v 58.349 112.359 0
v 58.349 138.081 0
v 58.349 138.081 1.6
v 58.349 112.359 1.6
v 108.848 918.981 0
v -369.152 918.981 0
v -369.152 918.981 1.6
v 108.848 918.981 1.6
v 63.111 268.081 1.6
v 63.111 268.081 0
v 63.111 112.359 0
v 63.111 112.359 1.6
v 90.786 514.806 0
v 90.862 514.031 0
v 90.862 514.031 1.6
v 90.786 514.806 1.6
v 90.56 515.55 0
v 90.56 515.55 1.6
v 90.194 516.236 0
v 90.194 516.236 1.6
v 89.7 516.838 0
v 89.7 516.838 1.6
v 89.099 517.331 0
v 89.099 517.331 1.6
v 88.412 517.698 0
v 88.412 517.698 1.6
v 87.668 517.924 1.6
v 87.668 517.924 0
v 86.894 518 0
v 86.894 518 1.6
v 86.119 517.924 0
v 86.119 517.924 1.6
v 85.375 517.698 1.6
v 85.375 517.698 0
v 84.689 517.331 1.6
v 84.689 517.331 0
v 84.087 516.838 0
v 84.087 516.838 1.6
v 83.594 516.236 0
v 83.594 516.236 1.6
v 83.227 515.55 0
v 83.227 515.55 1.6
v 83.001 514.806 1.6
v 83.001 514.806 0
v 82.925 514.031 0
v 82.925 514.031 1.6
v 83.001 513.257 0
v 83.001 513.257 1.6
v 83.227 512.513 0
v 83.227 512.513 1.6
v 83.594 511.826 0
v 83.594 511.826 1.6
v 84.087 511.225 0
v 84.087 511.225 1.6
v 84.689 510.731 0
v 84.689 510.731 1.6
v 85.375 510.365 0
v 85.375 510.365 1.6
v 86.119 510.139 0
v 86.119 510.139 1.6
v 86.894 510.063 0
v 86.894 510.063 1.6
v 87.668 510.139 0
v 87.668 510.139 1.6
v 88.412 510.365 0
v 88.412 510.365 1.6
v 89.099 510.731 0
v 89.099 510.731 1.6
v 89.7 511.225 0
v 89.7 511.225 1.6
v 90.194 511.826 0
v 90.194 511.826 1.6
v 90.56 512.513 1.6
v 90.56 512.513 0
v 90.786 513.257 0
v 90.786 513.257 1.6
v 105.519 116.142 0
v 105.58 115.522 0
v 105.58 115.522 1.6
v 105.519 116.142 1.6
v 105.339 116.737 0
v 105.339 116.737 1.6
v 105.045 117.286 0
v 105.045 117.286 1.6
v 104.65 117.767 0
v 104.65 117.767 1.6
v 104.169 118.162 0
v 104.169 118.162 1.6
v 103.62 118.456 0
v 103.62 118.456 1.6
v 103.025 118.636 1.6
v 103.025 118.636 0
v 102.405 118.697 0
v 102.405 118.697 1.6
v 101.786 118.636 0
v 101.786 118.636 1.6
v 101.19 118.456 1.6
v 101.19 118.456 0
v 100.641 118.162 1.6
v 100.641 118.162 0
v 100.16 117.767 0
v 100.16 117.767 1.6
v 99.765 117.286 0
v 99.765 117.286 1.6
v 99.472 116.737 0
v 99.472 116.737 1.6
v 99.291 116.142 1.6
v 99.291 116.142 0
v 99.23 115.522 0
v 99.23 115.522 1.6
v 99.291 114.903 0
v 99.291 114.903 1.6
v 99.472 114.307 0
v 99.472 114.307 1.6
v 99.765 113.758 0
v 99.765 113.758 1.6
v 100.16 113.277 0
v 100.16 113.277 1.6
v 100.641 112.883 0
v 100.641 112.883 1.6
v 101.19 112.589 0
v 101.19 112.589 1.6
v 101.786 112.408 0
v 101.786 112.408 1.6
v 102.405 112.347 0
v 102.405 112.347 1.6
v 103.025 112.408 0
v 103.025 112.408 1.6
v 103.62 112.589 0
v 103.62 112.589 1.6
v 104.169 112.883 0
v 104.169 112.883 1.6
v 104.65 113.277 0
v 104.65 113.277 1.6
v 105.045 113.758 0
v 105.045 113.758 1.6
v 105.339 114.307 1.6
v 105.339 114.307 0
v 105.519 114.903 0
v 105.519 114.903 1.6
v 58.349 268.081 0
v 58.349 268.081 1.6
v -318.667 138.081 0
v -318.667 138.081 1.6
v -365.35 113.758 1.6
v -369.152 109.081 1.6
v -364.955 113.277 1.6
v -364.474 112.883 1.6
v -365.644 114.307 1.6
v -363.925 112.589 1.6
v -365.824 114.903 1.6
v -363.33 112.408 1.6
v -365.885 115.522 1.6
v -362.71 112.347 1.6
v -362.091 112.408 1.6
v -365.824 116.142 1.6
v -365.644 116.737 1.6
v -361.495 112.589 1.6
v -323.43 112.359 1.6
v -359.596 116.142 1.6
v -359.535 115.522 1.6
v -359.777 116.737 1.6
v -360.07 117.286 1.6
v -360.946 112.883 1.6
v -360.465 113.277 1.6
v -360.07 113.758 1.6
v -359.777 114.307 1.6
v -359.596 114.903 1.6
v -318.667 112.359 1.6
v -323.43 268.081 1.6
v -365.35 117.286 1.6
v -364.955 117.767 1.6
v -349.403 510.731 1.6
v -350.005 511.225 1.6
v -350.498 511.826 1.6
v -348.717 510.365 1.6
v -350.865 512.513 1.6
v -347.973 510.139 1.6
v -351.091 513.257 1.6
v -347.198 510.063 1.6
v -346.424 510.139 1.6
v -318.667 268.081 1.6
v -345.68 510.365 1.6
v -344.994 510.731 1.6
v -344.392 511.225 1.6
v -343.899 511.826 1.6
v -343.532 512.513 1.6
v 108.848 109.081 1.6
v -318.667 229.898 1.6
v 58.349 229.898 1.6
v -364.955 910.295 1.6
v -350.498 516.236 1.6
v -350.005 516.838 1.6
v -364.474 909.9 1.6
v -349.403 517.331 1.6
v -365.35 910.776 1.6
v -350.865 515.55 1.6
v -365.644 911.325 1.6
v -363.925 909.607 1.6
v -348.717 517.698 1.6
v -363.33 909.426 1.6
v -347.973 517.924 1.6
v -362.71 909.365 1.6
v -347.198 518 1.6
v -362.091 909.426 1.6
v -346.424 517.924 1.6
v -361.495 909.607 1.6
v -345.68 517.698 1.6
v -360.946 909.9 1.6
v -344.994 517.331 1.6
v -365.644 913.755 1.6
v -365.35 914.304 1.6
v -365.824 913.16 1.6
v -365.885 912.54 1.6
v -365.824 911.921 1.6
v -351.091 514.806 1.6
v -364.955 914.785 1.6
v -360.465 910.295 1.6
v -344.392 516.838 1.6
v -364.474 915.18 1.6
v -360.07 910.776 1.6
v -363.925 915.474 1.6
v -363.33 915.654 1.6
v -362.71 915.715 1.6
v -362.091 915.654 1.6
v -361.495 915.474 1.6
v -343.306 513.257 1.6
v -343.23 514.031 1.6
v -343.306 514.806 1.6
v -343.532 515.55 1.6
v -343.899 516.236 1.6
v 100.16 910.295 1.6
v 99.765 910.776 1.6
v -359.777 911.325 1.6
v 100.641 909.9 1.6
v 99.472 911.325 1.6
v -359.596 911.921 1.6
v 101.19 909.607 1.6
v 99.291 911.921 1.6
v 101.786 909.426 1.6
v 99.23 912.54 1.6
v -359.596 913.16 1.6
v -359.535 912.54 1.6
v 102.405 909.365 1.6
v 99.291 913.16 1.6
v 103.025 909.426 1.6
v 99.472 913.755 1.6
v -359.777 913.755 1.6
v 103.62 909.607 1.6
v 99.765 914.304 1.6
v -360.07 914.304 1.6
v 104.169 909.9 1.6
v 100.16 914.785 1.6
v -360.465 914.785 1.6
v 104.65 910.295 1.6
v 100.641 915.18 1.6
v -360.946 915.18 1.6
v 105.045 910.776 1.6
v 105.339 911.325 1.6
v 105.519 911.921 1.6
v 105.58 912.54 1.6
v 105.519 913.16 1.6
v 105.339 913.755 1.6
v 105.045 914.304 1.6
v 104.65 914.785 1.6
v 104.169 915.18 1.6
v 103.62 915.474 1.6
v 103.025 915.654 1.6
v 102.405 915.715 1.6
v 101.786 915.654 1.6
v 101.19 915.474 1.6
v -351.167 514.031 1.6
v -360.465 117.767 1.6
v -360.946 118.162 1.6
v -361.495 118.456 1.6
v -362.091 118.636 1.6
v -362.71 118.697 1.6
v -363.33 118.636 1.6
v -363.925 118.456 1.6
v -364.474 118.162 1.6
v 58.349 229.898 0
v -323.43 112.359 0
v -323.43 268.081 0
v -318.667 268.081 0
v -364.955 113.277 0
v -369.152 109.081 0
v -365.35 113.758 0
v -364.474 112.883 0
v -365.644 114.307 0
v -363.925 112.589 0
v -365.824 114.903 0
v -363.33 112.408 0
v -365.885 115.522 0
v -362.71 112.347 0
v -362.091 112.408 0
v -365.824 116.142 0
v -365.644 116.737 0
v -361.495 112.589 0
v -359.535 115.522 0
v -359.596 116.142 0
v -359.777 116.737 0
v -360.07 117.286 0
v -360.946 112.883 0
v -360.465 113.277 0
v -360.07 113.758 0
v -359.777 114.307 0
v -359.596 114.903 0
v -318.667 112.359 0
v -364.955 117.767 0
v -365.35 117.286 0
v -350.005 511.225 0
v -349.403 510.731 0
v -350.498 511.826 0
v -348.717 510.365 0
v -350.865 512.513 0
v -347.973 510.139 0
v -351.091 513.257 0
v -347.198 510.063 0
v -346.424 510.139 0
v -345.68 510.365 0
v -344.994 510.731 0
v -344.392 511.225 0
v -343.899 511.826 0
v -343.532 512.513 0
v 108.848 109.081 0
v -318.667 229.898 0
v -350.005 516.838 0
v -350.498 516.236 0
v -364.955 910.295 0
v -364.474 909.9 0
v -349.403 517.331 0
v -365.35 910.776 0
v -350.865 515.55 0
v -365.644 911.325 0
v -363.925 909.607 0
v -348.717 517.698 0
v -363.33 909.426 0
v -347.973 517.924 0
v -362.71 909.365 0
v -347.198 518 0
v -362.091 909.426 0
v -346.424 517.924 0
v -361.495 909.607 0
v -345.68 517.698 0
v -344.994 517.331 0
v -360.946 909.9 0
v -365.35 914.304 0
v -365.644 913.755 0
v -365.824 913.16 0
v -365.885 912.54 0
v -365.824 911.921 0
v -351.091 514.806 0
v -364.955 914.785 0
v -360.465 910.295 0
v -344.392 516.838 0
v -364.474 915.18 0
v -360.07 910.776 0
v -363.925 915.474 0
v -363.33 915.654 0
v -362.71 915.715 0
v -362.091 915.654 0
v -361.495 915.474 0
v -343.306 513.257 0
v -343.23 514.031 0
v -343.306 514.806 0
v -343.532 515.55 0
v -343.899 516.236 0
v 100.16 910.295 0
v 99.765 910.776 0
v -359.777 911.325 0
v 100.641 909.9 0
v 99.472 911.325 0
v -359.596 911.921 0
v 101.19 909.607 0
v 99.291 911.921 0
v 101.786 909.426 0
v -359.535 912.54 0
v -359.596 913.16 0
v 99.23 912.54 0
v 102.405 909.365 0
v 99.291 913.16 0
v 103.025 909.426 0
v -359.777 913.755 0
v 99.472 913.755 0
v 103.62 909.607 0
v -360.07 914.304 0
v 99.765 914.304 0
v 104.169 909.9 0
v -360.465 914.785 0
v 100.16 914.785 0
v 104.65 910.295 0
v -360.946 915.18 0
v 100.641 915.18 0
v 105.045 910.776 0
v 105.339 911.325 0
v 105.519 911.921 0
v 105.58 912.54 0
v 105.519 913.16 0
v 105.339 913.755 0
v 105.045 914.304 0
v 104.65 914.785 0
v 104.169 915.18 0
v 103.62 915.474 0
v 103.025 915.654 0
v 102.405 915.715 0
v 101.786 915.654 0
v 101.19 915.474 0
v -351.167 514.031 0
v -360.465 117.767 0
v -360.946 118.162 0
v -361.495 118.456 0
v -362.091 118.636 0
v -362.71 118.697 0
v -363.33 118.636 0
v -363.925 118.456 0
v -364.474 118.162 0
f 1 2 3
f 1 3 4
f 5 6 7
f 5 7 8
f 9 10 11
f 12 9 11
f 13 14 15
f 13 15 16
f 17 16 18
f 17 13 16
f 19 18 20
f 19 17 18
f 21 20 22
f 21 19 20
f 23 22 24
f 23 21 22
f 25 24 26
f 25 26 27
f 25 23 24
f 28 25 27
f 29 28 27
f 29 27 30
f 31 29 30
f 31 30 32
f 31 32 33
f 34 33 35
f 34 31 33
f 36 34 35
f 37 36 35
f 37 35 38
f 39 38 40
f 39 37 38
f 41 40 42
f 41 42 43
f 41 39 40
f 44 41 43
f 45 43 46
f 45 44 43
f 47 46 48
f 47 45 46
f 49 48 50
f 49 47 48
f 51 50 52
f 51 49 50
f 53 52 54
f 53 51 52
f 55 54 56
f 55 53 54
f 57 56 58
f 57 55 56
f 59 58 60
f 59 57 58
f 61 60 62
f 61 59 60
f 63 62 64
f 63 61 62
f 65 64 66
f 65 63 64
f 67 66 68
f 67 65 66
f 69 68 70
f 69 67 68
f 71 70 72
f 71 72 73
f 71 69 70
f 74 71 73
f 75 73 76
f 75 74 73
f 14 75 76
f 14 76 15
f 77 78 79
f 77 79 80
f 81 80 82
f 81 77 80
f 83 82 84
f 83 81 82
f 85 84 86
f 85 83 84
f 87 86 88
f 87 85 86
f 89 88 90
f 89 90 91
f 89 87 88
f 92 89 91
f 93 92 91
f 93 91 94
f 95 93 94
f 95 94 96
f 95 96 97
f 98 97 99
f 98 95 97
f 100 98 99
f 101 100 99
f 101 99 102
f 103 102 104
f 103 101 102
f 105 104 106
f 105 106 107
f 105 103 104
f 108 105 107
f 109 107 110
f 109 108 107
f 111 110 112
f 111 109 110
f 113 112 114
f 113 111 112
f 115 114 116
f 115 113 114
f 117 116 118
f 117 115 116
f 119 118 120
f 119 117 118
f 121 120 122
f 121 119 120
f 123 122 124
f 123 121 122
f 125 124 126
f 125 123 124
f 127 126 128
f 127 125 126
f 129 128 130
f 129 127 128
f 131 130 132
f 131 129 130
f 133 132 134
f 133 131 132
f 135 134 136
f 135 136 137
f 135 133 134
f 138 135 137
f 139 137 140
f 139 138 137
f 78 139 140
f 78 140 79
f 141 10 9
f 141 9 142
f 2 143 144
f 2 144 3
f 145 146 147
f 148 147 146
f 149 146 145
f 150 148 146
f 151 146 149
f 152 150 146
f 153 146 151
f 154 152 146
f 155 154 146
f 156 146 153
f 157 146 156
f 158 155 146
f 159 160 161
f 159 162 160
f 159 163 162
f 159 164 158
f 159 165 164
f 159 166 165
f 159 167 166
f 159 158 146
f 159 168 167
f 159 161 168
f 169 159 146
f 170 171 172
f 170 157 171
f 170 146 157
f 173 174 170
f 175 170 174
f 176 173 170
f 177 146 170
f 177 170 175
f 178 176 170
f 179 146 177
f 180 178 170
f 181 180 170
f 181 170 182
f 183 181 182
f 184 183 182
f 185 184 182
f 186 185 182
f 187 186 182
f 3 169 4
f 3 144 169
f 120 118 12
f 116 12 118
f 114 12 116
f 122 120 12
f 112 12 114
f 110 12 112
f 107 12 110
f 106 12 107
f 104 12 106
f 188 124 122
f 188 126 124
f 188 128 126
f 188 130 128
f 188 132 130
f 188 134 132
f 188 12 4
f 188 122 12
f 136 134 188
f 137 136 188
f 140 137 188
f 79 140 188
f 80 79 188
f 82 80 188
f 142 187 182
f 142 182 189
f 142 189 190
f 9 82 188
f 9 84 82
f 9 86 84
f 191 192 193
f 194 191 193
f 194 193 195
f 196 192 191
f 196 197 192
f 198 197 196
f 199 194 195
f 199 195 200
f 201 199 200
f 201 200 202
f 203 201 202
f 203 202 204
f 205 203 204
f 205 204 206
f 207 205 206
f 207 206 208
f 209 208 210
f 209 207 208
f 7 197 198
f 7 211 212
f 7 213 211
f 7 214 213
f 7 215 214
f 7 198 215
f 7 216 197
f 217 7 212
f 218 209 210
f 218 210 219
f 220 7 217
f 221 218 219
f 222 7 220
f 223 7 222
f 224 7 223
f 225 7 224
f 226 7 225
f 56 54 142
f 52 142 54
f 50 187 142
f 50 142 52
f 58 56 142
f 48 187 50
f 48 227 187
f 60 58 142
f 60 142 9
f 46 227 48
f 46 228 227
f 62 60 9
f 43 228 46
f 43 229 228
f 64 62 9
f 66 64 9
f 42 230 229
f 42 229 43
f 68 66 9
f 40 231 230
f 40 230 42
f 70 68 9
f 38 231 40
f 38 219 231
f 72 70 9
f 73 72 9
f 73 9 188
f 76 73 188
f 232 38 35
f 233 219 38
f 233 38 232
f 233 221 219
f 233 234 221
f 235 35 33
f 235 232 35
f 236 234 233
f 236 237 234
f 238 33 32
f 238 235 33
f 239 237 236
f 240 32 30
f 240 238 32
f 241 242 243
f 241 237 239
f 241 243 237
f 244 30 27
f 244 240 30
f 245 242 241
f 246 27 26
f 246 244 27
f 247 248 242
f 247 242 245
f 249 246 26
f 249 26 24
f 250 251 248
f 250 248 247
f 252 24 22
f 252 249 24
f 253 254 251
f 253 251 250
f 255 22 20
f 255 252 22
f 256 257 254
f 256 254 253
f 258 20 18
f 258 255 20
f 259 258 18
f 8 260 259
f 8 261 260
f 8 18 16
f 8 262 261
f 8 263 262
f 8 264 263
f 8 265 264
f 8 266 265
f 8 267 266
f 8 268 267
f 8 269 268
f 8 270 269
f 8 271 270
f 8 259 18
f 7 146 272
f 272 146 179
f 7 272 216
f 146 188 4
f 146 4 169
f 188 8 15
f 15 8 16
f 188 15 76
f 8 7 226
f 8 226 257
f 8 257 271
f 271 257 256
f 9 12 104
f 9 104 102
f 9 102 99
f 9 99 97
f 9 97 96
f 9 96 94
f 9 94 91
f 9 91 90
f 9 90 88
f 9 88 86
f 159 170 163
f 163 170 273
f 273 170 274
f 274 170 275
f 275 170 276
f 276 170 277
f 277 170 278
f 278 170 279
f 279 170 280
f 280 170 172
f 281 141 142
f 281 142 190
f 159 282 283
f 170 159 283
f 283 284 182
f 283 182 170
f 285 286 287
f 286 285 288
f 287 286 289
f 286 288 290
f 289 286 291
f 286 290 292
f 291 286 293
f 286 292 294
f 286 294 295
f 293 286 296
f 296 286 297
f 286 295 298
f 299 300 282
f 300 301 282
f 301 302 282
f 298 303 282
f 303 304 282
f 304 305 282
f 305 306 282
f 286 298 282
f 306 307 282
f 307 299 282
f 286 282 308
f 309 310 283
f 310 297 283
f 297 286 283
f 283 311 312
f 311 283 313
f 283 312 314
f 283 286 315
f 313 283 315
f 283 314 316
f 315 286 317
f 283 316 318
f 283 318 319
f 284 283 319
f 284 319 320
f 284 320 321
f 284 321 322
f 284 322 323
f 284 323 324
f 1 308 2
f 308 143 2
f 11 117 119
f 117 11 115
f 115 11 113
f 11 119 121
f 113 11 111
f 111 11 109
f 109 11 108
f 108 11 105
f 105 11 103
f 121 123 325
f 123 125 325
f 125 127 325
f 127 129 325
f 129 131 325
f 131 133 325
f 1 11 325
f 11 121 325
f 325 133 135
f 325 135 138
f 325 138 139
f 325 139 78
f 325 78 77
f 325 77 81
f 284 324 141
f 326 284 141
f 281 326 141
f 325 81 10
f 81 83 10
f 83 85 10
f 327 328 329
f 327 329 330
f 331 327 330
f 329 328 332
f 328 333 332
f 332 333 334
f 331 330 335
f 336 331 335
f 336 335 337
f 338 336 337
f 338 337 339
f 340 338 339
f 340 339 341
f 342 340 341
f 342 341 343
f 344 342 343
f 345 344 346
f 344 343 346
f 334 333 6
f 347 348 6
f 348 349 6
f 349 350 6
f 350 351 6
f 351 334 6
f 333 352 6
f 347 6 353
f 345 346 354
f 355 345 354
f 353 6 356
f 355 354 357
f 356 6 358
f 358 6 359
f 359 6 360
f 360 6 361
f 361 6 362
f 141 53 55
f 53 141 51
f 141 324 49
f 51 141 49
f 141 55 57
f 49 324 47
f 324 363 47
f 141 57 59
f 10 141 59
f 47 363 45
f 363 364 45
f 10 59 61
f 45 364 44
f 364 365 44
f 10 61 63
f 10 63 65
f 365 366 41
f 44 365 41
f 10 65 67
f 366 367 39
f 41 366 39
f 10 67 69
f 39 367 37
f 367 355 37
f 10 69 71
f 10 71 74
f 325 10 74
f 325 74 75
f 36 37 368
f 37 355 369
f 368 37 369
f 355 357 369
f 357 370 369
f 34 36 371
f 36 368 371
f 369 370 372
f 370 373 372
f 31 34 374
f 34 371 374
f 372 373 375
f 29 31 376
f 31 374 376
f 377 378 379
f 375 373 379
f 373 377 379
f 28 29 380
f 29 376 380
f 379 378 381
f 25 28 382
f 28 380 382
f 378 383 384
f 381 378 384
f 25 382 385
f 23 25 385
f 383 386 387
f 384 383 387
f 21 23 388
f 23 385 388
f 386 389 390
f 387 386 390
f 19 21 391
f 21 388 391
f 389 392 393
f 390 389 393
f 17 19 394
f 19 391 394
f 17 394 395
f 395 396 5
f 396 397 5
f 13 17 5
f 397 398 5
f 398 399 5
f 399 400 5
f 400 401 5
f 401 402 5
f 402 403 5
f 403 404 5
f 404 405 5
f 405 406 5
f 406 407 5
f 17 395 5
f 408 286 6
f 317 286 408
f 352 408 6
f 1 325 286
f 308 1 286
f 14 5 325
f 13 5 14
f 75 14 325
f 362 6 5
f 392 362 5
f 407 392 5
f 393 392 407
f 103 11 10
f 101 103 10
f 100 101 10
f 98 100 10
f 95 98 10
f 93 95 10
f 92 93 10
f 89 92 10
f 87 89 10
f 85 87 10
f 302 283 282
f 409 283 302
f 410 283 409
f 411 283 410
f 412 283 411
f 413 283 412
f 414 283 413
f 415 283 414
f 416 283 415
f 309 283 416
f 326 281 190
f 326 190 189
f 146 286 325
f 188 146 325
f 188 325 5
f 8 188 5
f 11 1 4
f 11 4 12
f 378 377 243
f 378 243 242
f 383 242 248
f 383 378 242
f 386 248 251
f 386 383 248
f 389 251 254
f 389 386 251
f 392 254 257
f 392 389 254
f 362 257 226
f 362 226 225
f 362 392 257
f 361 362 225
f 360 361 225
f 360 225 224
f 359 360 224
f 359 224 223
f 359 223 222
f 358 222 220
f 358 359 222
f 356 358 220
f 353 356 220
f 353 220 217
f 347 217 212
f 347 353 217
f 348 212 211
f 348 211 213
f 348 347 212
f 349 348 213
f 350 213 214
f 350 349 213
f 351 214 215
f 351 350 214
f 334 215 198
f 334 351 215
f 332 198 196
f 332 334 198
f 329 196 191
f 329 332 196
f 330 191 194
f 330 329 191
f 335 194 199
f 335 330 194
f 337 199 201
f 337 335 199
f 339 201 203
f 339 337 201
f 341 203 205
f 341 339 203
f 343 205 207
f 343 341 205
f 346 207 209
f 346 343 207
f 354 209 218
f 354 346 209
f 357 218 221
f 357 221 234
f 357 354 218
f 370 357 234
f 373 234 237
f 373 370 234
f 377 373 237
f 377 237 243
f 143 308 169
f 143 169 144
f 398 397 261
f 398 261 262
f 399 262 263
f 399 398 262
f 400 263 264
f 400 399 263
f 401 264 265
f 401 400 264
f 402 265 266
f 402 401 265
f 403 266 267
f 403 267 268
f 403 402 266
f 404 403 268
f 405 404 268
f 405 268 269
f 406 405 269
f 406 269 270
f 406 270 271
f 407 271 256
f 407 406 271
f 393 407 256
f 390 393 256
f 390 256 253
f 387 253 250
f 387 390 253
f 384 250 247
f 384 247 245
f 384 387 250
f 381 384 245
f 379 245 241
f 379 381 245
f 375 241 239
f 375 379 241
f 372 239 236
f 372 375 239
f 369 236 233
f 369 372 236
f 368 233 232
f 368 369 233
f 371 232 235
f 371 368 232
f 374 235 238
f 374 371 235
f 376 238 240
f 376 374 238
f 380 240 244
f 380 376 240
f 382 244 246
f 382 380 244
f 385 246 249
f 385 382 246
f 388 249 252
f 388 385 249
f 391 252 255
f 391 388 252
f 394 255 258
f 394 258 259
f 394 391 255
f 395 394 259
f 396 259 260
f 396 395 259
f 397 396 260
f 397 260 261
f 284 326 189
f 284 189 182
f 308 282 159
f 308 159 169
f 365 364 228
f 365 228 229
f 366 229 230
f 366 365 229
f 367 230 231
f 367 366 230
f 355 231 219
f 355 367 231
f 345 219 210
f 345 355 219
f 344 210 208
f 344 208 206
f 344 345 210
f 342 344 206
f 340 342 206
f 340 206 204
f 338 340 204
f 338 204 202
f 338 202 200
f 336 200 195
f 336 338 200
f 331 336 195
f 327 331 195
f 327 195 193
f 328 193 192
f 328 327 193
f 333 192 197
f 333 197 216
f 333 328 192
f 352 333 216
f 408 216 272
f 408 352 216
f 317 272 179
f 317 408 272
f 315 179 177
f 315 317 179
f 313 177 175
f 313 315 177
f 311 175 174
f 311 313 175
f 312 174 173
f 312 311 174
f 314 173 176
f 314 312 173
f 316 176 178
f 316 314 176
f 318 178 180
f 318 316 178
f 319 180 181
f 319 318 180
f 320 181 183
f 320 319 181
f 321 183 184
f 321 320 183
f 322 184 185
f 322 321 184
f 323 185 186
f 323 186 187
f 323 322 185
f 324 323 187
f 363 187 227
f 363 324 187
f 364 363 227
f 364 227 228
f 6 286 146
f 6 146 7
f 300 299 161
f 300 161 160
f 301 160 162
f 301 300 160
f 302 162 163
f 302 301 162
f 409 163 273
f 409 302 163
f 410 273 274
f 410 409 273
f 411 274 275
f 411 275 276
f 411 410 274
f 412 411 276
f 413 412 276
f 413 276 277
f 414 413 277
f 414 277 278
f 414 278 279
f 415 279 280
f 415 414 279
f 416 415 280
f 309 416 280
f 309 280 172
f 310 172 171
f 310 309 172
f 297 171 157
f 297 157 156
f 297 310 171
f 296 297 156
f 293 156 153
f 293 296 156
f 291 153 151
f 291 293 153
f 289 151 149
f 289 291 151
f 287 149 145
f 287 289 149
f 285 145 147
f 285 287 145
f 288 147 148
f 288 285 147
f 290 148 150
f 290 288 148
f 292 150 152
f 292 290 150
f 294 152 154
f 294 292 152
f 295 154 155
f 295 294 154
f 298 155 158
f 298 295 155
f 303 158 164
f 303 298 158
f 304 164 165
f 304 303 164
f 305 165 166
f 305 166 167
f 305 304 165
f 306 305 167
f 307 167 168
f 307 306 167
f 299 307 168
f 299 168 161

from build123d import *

# Parameters (mm, degrees)
SKETCH2_W           = 478
SKETCH2_H           = 809.900101531
SKETCH2_R           = 3.175
SKETCH2_R_2         = 3.96875
BOSS_EXTRUDE1_DEPTH = 1.6002


with BuildPart() as part:
    # Sketch2 → Boss-Extrude1 (new body)
    with BuildSketch(Plane.XY):
        with Locations((-130.152406859, 514.031343345)):
            Rectangle(SKETCH2_W, SKETCH2_H)
        with Locations((-362.710206859, 115.522426029)):
            Circle(SKETCH2_R, mode=Mode.SUBTRACT)
        with Locations((102.405393141, 912.54036211)):
            Circle(SKETCH2_R, mode=Mode.SUBTRACT)
        with Locations((-362.710206859, 912.54036211)):
            Circle(SKETCH2_R, mode=Mode.SUBTRACT)
        with Locations((102.405393141, 115.522426029)):
            Circle(SKETCH2_R, mode=Mode.SUBTRACT)
        with Locations((86.893613141, 514.031343345)):
            Circle(SKETCH2_R_2, mode=Mode.SUBTRACT)
        with Locations((-347.198426859, 514.031343345)):
            Circle(SKETCH2_R_2, mode=Mode.SUBTRACT)
        Polygon((63.111393141, 112.35889233), (63.111393141, 229.898149855), (63.111393141, 268.081394028), (58.348893141, 268.081394028), (58.348893141, 229.898149855), (-318.667460794, 229.898149855), (-318.667460794, 268.081394028), (-323.429960794, 268.081394028), (-323.429960794, 229.898149855), (-323.429960794, 112.35889233), (-318.667460794, 112.35889233), (-318.667460794, 138.081394028), (58.348893141, 138.081394028), (58.348893141, 112.35889233), align=None, mode=Mode.SUBTRACT)
    extrude(amount=BOSS_EXTRUDE1_DEPTH)


solid = part.part
